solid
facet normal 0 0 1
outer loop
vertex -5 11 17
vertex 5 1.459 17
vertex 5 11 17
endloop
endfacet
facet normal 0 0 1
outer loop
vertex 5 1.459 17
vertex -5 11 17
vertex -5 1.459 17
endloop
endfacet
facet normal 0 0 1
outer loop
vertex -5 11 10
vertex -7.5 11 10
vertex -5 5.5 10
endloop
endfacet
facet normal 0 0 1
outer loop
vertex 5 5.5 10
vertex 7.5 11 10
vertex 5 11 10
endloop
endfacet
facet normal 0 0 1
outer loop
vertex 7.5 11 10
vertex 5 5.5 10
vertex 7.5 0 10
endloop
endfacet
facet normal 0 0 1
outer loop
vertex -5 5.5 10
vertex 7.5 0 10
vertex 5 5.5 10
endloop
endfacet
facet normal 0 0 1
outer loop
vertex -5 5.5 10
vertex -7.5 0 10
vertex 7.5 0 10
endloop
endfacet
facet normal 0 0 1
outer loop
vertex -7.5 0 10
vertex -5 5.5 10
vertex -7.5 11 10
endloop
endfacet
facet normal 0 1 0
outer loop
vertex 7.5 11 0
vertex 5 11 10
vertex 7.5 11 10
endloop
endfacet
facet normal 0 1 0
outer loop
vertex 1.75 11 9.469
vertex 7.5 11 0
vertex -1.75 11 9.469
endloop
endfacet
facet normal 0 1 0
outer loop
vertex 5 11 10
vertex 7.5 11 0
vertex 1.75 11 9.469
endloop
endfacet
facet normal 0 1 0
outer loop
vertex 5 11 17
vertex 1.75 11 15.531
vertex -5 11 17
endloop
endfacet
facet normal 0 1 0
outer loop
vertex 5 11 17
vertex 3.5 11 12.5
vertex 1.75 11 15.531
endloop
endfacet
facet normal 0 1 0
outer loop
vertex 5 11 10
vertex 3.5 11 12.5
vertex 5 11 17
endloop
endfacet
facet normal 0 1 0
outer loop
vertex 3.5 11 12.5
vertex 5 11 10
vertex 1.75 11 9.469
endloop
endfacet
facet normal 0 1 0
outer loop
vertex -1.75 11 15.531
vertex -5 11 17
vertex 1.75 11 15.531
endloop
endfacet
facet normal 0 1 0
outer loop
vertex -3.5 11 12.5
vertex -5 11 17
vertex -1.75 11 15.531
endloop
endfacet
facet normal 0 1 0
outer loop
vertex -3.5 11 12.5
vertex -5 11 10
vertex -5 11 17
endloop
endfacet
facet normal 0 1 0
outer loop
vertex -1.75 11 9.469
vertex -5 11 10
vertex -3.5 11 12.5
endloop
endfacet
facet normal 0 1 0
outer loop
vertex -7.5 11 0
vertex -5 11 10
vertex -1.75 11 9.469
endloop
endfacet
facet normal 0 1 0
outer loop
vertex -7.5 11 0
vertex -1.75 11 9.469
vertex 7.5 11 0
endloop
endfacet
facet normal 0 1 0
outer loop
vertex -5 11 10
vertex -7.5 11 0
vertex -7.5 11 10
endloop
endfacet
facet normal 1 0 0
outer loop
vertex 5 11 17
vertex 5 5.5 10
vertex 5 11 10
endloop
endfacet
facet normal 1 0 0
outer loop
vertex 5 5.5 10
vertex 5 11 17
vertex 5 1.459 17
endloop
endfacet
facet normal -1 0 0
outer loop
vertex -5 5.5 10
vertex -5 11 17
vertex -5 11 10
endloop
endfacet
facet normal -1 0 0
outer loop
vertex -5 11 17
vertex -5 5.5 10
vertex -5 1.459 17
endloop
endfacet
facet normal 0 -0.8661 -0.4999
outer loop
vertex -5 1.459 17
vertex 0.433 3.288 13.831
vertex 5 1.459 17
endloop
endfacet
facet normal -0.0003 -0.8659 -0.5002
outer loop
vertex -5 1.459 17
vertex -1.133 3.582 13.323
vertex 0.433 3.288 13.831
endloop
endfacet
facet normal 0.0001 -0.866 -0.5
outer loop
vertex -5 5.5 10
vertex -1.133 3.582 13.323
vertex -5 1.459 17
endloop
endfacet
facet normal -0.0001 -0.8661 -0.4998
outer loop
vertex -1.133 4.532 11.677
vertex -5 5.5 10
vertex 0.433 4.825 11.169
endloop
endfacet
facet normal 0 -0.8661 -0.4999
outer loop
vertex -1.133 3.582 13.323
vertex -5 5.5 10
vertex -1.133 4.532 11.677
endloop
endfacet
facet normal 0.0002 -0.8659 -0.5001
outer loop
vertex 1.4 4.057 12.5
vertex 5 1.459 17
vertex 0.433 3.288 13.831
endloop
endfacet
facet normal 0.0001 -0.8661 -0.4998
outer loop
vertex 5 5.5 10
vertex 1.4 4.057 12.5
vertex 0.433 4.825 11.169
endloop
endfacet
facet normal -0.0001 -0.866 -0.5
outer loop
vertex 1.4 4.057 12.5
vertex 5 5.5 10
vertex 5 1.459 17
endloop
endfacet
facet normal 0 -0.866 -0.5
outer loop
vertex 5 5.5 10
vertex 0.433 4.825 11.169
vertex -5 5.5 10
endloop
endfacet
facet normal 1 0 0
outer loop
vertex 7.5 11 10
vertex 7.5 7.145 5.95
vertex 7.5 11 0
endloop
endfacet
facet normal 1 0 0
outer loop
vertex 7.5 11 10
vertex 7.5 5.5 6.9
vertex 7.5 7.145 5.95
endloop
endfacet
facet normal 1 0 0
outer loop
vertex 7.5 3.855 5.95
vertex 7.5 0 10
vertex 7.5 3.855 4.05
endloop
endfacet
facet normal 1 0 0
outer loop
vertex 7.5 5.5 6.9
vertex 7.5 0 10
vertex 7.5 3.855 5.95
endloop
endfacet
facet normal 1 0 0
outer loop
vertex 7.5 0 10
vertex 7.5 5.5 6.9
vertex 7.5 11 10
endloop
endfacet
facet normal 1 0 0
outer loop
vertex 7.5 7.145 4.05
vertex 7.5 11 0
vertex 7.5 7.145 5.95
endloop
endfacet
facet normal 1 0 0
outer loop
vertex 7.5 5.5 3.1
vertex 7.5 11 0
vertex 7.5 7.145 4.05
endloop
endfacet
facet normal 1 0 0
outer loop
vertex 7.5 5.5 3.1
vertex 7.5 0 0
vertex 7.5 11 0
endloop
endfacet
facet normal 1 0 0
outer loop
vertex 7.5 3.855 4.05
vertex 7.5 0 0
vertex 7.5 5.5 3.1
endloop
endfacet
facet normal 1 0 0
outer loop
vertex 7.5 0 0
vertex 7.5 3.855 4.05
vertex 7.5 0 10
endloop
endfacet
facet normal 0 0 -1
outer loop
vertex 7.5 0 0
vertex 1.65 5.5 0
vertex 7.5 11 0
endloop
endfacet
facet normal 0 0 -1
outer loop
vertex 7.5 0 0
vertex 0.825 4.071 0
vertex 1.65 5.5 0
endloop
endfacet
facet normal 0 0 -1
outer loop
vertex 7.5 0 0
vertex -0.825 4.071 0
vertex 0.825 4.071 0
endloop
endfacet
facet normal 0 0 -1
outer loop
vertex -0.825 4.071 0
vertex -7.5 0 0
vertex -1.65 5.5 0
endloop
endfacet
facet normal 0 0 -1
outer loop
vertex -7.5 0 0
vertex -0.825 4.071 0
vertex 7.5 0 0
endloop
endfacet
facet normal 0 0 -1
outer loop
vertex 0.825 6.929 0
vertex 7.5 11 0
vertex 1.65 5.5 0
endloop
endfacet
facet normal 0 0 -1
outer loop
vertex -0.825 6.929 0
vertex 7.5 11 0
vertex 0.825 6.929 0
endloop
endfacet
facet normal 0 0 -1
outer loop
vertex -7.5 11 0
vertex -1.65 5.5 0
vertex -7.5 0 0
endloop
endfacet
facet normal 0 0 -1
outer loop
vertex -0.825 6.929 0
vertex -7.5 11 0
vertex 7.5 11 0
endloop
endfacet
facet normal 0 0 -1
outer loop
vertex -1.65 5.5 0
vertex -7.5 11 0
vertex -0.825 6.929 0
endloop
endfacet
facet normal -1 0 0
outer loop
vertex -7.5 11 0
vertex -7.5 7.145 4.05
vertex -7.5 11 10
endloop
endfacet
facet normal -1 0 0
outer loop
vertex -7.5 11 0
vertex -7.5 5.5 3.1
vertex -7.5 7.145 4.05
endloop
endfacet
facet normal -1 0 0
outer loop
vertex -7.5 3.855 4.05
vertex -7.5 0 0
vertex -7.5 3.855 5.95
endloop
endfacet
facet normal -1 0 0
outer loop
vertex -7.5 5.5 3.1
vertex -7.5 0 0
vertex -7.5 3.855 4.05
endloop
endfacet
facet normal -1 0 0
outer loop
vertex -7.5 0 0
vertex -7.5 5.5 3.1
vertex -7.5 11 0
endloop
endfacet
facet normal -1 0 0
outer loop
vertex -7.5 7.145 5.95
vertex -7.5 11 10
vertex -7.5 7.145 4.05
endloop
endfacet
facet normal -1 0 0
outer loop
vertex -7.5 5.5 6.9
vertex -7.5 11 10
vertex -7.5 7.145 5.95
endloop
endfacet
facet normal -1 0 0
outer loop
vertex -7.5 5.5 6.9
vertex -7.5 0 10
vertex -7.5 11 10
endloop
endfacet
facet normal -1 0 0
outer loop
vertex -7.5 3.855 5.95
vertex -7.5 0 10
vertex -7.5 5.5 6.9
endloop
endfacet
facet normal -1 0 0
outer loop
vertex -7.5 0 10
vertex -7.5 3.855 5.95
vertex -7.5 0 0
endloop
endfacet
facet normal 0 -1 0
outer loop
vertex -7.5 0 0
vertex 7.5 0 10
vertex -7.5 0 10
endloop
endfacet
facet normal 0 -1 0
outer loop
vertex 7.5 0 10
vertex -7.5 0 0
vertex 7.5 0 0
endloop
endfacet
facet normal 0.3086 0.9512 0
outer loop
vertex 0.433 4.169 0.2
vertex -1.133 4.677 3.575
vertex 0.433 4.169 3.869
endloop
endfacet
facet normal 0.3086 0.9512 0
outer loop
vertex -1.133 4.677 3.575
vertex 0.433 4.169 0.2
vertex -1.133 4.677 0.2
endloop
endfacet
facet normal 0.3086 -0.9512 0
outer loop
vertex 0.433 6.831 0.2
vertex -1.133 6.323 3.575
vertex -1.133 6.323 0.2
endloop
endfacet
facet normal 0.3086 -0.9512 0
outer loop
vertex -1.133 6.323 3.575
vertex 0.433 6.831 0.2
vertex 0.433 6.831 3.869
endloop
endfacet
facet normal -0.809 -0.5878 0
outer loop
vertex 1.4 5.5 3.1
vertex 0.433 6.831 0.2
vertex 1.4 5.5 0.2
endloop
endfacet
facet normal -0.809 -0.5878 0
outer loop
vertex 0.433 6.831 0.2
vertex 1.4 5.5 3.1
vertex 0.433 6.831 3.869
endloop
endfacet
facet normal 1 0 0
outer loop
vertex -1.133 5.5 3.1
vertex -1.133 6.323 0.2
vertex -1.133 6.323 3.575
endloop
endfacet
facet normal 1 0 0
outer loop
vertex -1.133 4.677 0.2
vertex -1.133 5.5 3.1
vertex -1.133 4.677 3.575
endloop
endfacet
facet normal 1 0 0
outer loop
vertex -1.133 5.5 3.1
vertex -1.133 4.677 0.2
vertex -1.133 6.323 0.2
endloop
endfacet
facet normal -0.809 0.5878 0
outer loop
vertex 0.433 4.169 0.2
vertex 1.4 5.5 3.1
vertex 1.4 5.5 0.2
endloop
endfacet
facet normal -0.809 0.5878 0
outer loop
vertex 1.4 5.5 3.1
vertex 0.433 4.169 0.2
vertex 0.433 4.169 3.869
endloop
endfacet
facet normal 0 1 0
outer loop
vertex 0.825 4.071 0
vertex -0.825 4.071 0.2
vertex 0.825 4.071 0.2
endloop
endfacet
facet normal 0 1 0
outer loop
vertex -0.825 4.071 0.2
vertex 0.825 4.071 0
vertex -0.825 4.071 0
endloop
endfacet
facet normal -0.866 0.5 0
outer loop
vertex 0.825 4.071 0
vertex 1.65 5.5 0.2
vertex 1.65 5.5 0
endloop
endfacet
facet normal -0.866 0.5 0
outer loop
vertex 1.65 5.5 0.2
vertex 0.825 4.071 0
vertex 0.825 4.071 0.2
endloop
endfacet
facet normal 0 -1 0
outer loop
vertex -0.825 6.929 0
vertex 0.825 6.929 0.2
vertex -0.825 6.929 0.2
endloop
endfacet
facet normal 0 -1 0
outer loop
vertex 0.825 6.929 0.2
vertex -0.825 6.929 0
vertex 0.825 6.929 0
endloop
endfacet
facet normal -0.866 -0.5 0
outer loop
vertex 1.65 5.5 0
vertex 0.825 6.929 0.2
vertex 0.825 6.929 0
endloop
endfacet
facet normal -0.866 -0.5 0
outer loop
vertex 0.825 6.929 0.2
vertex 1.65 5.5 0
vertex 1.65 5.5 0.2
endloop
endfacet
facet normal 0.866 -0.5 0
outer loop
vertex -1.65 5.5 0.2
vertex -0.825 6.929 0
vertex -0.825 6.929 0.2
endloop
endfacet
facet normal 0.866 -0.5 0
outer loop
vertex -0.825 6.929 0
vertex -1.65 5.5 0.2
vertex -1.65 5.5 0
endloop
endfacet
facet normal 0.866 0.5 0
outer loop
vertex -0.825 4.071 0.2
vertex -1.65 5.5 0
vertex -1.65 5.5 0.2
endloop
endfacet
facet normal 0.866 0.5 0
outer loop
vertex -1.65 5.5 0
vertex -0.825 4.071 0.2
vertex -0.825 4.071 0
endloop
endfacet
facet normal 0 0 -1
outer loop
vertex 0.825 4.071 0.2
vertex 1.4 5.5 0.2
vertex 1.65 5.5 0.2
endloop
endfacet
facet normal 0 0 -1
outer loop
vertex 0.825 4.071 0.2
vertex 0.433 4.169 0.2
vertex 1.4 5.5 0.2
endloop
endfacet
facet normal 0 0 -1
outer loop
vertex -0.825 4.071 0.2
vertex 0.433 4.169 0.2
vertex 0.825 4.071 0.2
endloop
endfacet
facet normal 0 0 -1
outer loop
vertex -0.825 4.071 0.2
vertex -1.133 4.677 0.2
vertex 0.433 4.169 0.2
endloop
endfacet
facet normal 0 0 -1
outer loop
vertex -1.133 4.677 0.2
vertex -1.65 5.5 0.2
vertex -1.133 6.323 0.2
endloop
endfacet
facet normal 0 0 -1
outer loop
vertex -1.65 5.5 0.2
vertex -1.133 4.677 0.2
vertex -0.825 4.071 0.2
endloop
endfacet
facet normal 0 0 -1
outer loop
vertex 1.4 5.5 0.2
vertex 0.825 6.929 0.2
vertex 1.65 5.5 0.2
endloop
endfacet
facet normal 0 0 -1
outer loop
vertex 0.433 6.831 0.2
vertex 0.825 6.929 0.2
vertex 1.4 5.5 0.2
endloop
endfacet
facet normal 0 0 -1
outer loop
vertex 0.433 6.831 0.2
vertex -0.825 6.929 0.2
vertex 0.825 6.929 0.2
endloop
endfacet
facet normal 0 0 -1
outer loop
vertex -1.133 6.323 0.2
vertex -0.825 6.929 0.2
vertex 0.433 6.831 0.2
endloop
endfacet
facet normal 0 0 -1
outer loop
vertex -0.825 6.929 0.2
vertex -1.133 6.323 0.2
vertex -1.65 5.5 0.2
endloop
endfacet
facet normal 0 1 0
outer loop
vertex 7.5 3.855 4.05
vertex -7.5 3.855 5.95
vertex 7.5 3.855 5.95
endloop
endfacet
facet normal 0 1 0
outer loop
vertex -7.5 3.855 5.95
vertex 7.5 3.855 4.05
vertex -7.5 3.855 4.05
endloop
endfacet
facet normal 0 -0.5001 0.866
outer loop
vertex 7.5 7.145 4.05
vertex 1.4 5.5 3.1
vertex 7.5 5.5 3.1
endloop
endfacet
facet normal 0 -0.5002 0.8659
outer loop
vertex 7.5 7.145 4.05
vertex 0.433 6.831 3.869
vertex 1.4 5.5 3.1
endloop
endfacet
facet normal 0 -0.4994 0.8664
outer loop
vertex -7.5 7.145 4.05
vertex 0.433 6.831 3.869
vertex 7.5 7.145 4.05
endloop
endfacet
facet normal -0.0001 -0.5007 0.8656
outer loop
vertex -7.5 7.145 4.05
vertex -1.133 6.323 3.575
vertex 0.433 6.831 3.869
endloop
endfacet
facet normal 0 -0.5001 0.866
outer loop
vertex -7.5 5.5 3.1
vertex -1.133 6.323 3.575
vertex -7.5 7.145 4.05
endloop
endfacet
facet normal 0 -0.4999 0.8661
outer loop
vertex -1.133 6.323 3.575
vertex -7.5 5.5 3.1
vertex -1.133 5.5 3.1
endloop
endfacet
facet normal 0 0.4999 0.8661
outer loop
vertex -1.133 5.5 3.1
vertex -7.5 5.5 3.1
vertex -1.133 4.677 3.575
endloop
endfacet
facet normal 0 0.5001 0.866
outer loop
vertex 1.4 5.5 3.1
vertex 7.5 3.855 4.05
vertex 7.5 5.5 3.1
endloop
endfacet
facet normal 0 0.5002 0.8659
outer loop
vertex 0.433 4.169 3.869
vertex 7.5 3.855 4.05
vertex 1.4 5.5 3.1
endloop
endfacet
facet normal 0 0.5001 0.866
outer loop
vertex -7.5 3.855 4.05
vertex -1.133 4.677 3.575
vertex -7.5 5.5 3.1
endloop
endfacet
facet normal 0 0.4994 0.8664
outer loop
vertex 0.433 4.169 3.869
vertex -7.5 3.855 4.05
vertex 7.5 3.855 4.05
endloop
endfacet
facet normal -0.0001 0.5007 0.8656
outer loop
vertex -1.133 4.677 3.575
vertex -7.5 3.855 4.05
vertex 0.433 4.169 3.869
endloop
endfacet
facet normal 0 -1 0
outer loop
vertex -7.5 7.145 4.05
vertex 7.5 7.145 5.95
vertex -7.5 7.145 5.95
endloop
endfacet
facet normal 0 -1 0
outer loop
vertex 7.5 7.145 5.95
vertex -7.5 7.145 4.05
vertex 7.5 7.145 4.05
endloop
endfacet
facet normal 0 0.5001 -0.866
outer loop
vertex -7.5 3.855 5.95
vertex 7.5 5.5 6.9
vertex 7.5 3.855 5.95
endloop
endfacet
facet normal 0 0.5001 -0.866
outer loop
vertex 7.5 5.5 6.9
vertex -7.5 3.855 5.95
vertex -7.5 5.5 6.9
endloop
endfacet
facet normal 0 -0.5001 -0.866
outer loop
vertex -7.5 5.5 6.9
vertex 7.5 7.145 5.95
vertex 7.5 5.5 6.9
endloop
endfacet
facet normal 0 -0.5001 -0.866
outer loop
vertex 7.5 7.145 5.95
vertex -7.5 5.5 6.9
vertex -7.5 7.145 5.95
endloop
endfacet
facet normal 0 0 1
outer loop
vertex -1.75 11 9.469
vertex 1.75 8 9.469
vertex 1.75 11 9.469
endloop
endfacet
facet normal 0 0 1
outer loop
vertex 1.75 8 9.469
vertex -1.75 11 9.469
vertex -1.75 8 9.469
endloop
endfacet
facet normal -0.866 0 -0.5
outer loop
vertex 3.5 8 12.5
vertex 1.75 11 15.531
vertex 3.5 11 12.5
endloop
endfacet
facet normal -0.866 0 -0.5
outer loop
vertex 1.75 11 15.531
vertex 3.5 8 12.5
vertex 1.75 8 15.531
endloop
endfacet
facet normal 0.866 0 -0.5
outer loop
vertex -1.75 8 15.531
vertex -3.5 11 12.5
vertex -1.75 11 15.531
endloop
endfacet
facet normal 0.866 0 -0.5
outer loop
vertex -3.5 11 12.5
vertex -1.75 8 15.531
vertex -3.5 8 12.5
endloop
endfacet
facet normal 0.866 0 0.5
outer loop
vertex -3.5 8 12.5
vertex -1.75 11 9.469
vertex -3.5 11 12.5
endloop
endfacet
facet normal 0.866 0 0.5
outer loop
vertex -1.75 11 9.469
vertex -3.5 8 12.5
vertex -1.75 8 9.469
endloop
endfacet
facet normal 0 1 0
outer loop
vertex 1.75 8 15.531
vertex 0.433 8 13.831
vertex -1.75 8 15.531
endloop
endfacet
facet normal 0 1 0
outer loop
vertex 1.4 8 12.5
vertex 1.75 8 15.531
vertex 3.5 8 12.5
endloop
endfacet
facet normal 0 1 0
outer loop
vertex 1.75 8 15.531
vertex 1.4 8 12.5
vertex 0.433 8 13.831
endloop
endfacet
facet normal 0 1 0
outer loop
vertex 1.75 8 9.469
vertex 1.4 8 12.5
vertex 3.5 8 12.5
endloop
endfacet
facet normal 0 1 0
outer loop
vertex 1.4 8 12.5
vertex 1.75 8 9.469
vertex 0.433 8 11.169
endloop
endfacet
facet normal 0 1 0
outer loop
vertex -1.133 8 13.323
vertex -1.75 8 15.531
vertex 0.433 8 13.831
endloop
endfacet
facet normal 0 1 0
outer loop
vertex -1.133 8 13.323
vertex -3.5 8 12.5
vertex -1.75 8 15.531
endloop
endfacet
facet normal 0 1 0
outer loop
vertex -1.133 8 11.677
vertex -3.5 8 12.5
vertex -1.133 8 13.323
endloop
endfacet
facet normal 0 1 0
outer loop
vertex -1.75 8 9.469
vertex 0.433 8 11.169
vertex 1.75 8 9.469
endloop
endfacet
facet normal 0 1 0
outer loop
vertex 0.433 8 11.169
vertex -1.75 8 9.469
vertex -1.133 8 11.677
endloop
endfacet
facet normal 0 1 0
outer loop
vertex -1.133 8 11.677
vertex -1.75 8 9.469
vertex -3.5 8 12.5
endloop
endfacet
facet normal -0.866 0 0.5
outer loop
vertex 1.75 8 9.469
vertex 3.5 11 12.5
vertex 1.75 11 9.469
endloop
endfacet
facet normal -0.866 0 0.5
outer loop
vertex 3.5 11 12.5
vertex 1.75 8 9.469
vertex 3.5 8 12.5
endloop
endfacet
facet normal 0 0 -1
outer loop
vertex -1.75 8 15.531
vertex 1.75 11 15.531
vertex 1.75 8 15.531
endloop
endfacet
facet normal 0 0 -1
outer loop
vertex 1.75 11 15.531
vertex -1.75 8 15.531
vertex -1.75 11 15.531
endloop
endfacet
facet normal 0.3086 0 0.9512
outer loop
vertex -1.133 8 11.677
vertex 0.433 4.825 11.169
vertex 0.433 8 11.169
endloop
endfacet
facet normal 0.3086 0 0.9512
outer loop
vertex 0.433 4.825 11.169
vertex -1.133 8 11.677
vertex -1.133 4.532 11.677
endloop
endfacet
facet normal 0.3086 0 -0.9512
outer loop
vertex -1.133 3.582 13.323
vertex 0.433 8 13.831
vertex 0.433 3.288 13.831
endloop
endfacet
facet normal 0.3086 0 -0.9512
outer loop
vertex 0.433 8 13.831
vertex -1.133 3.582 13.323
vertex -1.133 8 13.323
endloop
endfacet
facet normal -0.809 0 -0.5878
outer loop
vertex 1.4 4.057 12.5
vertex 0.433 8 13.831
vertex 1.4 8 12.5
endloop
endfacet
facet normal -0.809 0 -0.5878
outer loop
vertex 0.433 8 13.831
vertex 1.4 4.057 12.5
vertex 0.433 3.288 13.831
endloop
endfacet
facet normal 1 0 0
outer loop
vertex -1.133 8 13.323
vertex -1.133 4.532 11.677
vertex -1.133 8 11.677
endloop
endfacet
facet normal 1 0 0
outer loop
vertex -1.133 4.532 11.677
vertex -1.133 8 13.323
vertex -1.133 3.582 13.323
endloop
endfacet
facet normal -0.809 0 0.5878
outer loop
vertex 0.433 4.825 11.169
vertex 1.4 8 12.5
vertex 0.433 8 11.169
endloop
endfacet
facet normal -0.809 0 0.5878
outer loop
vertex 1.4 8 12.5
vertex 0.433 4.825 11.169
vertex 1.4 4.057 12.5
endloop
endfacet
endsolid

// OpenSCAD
// file: common_parts.scad
include <tunable_constants.scad>;
//common_flat_screw_tap();
module M3_flat_screw(l = 10, l2 = 0) {
    // l2 is amount of the screw that are bigger for sliding through the hole
    tap_z = 1.9;
    rotate([180,0,0])
    union() {
        cylinder(d = C_M3_DIAMETER_THREAD, h= l);
        cylinder(d = C_M3_DIAMETER, h= l2);
        translate([0,0,-0.1+0.1]) cylinder(d1 = 6.5, d2= C_M3_DIAMETER_THREAD, h= tap_z);
        translate([0,0,-0.1]) cylinder(d = 6.5, h= 0.3);
    }
}

module M4_button_screw(l = 10, l2 = 0) {
    rotate([180,0,0])
    union() {
        cylinder(d = C_M4_DIAMETER_THREAD, h= l);
        cylinder(d = C_M4_DIAMETER, h= l2);
        translate([0,0,-4]) cylinder(d = 8, h=4);
    }
}
module M3_button_screw(l = 10, l2 = 0) {
    rotate([180,0,0])
    union() {
        cylinder(d = C_M3_DIAMETER_THREAD, h= l);
        cylinder(d = C_M3_DIAMETER, h= l2);
        translate([0,0,-4]) cylinder(d =6, h=4);
    }
}

module roundedcube(xdim ,ydim ,zdim,rdim){
    hull(){
        fn=30;
        translate([rdim,rdim,0]) cylinder(r=rdim, h=zdim, $fn=fn);
        translate([xdim-rdim,rdim,0])cylinder(r=rdim, h=zdim, $fn=fn);

        translate([rdim,ydim-rdim,0]) cylinder(r=rdim, h=zdim, $fn=fn);
        translate([xdim-rdim,ydim-rdim,0]) cylinder(r=rdim, h=zdim, $fn=fn);
    }
}
//beam45();
module beam45(w = 10, l = 10, h = 8) {
    difference() {
        union() {
            translate([-w/2,0,0]) cube([w,l,h]);
        }
        translate([w/2,0,0]) rotate([0,45,0])translate([-w-h,-1,0]) cube([w+h*2,l+2,h*2]);
        translate([-w/2,0,0]) rotate([0,-45,0])translate([0-w,-1,0]) cube([w+h*2,l+2,h*2]);
    }
}
//beam30();
module beam30(w = 10, l = 10, h = 8) {
    difference() {
        union() {
            translate([-w/2,0,0]) cube([w,l,h]);
        }
        translate([w/2,0,0]) rotate([0,90-30,0])translate([-w-h,-1,0]) cube([w+h*2,l+2,h*2]);
        translate([-w/2,0,0]) rotate([0,-90+30,0])translate([0-w,-1,0]) cube([w+h*2,l+2,h*2]);
    }
}

halfbeam30(w = 100, l = 10, h = 8);
module halfbeam30(w = 10, l = 10, h = 8) {
    difference() {
        union() {
            translate([-w/2,0,0]) cube([w,l,h]);
        }
        translate([0,-l*0.1,0])rotate([0,+30,0]) cube([w+l+h,w+l+h+l*0.1,w+l+h]);
        //translate([-w/2,0,0]) rotate([0,-90+30,0])translate([0-w,-1,0]) cube([w+h*2,l+2,h*2]);
    }
}



module cylinder_outer(height,radius,fn){
   fudge = 1/cos(180/fn);
   cylinder(h=height,r=radius*fudge,$fn=fn);
}

//indicator_dots(2);

module indicator_dots(valueIn) {
    for (a =[0:1:valueIn-1]) {
        translate([a*3,0,0]) cube([2,2,1]);
    }
}
// file: tunable_constants.scad
// Change parameters to fit your printer and slicer differences

C_M3_DIAMETER = 3.3; // size of a hole that a M3 screw will slide through
C_M3_DIAMETER_THREAD = 2.8; // size of a hole that a M3 screw will create own threads in

C_M3_NUT = 7;

C_KINGPIN_LOOSE = 3.5; // The hole for kingpin in the arms that are suposed to slide
C_KINGPIN_SNUG = 3.3; // The hole in the steering hub where the kingpin is suposed to be tightly locked with a screw

C_M4_NUT = 8.4;

C_M4_DIAMETER = 4.1; // size of a hole that a M4 screw will slide through
C_M4_DIAMETER_THREAD = 3.8; // size of a hole that a M4 screw will create own threads in

    b_12mm_tol = 0.3; // tolerance for bearing with 12mm diameter

C_12MM_BEARING_D = 12+b_12mm_tol; // Size of a hole that hold a 12mm bearing
C_12MM_BEARING_H = 3.5;

C_8MM_LOOSE = 8.7; // Loose fitting that will guarantie that it will not touch
C_8MM_TIGHT = 8.2; // Tight fitting for indrive etc
C_8MM_FIT = 8.5; // Perfect fit for it to be removable but not by much force, used for left wheel mount

C_SIGHT_MOUNT_S = 33.3375;
C_SIGHT_SCREW_D = 4.7;

C_MOUNT1_W = 28;
// ############# Settings ################
S_CASTER = 4;
S_CAMBER = 2;

S_BAR_W = 25;
S_BAR_H = 5;
// main file
//
include <tunable_constants.scad>;
use <common_parts.scad>


wall = 4;
w = 15;
h = 10;
l = 11;



pinmount_M4();
module pinmount_M4() {
    difference() {
        union() {
            translate([-w/2,0,0]) cube([w,l,h]);
            translate([-10/2,l/2,h]) rotate([0,0,-90]) halfbeam30(w=l, l=10, h=7);
            
        }
        
        screws();
    }
}

%screws();
module screws() {

    // pin
    translate([-20,l/2,h/2])rotate([0,90,0]) cylinder(d=C_M4_DIAMETER_THREAD, h = 50);
    
    // lock screw
    translate([0,l/2,-5]) rotate([180,0,0]) M3_flat_screw(l=h/2+5,l2=5.2);
    
    // mount screw & nut
    translate([0,l,h+3/2+1]) rotate([90,0,0]) cylinder(d=C_M3_NUT, h = 3, $fn=6);
    
    translate([0,l,h+3/2+1]) rotate([90,0,0]) cylinder(d=C_M3_DIAMETER_THREAD, h = 30);
}
